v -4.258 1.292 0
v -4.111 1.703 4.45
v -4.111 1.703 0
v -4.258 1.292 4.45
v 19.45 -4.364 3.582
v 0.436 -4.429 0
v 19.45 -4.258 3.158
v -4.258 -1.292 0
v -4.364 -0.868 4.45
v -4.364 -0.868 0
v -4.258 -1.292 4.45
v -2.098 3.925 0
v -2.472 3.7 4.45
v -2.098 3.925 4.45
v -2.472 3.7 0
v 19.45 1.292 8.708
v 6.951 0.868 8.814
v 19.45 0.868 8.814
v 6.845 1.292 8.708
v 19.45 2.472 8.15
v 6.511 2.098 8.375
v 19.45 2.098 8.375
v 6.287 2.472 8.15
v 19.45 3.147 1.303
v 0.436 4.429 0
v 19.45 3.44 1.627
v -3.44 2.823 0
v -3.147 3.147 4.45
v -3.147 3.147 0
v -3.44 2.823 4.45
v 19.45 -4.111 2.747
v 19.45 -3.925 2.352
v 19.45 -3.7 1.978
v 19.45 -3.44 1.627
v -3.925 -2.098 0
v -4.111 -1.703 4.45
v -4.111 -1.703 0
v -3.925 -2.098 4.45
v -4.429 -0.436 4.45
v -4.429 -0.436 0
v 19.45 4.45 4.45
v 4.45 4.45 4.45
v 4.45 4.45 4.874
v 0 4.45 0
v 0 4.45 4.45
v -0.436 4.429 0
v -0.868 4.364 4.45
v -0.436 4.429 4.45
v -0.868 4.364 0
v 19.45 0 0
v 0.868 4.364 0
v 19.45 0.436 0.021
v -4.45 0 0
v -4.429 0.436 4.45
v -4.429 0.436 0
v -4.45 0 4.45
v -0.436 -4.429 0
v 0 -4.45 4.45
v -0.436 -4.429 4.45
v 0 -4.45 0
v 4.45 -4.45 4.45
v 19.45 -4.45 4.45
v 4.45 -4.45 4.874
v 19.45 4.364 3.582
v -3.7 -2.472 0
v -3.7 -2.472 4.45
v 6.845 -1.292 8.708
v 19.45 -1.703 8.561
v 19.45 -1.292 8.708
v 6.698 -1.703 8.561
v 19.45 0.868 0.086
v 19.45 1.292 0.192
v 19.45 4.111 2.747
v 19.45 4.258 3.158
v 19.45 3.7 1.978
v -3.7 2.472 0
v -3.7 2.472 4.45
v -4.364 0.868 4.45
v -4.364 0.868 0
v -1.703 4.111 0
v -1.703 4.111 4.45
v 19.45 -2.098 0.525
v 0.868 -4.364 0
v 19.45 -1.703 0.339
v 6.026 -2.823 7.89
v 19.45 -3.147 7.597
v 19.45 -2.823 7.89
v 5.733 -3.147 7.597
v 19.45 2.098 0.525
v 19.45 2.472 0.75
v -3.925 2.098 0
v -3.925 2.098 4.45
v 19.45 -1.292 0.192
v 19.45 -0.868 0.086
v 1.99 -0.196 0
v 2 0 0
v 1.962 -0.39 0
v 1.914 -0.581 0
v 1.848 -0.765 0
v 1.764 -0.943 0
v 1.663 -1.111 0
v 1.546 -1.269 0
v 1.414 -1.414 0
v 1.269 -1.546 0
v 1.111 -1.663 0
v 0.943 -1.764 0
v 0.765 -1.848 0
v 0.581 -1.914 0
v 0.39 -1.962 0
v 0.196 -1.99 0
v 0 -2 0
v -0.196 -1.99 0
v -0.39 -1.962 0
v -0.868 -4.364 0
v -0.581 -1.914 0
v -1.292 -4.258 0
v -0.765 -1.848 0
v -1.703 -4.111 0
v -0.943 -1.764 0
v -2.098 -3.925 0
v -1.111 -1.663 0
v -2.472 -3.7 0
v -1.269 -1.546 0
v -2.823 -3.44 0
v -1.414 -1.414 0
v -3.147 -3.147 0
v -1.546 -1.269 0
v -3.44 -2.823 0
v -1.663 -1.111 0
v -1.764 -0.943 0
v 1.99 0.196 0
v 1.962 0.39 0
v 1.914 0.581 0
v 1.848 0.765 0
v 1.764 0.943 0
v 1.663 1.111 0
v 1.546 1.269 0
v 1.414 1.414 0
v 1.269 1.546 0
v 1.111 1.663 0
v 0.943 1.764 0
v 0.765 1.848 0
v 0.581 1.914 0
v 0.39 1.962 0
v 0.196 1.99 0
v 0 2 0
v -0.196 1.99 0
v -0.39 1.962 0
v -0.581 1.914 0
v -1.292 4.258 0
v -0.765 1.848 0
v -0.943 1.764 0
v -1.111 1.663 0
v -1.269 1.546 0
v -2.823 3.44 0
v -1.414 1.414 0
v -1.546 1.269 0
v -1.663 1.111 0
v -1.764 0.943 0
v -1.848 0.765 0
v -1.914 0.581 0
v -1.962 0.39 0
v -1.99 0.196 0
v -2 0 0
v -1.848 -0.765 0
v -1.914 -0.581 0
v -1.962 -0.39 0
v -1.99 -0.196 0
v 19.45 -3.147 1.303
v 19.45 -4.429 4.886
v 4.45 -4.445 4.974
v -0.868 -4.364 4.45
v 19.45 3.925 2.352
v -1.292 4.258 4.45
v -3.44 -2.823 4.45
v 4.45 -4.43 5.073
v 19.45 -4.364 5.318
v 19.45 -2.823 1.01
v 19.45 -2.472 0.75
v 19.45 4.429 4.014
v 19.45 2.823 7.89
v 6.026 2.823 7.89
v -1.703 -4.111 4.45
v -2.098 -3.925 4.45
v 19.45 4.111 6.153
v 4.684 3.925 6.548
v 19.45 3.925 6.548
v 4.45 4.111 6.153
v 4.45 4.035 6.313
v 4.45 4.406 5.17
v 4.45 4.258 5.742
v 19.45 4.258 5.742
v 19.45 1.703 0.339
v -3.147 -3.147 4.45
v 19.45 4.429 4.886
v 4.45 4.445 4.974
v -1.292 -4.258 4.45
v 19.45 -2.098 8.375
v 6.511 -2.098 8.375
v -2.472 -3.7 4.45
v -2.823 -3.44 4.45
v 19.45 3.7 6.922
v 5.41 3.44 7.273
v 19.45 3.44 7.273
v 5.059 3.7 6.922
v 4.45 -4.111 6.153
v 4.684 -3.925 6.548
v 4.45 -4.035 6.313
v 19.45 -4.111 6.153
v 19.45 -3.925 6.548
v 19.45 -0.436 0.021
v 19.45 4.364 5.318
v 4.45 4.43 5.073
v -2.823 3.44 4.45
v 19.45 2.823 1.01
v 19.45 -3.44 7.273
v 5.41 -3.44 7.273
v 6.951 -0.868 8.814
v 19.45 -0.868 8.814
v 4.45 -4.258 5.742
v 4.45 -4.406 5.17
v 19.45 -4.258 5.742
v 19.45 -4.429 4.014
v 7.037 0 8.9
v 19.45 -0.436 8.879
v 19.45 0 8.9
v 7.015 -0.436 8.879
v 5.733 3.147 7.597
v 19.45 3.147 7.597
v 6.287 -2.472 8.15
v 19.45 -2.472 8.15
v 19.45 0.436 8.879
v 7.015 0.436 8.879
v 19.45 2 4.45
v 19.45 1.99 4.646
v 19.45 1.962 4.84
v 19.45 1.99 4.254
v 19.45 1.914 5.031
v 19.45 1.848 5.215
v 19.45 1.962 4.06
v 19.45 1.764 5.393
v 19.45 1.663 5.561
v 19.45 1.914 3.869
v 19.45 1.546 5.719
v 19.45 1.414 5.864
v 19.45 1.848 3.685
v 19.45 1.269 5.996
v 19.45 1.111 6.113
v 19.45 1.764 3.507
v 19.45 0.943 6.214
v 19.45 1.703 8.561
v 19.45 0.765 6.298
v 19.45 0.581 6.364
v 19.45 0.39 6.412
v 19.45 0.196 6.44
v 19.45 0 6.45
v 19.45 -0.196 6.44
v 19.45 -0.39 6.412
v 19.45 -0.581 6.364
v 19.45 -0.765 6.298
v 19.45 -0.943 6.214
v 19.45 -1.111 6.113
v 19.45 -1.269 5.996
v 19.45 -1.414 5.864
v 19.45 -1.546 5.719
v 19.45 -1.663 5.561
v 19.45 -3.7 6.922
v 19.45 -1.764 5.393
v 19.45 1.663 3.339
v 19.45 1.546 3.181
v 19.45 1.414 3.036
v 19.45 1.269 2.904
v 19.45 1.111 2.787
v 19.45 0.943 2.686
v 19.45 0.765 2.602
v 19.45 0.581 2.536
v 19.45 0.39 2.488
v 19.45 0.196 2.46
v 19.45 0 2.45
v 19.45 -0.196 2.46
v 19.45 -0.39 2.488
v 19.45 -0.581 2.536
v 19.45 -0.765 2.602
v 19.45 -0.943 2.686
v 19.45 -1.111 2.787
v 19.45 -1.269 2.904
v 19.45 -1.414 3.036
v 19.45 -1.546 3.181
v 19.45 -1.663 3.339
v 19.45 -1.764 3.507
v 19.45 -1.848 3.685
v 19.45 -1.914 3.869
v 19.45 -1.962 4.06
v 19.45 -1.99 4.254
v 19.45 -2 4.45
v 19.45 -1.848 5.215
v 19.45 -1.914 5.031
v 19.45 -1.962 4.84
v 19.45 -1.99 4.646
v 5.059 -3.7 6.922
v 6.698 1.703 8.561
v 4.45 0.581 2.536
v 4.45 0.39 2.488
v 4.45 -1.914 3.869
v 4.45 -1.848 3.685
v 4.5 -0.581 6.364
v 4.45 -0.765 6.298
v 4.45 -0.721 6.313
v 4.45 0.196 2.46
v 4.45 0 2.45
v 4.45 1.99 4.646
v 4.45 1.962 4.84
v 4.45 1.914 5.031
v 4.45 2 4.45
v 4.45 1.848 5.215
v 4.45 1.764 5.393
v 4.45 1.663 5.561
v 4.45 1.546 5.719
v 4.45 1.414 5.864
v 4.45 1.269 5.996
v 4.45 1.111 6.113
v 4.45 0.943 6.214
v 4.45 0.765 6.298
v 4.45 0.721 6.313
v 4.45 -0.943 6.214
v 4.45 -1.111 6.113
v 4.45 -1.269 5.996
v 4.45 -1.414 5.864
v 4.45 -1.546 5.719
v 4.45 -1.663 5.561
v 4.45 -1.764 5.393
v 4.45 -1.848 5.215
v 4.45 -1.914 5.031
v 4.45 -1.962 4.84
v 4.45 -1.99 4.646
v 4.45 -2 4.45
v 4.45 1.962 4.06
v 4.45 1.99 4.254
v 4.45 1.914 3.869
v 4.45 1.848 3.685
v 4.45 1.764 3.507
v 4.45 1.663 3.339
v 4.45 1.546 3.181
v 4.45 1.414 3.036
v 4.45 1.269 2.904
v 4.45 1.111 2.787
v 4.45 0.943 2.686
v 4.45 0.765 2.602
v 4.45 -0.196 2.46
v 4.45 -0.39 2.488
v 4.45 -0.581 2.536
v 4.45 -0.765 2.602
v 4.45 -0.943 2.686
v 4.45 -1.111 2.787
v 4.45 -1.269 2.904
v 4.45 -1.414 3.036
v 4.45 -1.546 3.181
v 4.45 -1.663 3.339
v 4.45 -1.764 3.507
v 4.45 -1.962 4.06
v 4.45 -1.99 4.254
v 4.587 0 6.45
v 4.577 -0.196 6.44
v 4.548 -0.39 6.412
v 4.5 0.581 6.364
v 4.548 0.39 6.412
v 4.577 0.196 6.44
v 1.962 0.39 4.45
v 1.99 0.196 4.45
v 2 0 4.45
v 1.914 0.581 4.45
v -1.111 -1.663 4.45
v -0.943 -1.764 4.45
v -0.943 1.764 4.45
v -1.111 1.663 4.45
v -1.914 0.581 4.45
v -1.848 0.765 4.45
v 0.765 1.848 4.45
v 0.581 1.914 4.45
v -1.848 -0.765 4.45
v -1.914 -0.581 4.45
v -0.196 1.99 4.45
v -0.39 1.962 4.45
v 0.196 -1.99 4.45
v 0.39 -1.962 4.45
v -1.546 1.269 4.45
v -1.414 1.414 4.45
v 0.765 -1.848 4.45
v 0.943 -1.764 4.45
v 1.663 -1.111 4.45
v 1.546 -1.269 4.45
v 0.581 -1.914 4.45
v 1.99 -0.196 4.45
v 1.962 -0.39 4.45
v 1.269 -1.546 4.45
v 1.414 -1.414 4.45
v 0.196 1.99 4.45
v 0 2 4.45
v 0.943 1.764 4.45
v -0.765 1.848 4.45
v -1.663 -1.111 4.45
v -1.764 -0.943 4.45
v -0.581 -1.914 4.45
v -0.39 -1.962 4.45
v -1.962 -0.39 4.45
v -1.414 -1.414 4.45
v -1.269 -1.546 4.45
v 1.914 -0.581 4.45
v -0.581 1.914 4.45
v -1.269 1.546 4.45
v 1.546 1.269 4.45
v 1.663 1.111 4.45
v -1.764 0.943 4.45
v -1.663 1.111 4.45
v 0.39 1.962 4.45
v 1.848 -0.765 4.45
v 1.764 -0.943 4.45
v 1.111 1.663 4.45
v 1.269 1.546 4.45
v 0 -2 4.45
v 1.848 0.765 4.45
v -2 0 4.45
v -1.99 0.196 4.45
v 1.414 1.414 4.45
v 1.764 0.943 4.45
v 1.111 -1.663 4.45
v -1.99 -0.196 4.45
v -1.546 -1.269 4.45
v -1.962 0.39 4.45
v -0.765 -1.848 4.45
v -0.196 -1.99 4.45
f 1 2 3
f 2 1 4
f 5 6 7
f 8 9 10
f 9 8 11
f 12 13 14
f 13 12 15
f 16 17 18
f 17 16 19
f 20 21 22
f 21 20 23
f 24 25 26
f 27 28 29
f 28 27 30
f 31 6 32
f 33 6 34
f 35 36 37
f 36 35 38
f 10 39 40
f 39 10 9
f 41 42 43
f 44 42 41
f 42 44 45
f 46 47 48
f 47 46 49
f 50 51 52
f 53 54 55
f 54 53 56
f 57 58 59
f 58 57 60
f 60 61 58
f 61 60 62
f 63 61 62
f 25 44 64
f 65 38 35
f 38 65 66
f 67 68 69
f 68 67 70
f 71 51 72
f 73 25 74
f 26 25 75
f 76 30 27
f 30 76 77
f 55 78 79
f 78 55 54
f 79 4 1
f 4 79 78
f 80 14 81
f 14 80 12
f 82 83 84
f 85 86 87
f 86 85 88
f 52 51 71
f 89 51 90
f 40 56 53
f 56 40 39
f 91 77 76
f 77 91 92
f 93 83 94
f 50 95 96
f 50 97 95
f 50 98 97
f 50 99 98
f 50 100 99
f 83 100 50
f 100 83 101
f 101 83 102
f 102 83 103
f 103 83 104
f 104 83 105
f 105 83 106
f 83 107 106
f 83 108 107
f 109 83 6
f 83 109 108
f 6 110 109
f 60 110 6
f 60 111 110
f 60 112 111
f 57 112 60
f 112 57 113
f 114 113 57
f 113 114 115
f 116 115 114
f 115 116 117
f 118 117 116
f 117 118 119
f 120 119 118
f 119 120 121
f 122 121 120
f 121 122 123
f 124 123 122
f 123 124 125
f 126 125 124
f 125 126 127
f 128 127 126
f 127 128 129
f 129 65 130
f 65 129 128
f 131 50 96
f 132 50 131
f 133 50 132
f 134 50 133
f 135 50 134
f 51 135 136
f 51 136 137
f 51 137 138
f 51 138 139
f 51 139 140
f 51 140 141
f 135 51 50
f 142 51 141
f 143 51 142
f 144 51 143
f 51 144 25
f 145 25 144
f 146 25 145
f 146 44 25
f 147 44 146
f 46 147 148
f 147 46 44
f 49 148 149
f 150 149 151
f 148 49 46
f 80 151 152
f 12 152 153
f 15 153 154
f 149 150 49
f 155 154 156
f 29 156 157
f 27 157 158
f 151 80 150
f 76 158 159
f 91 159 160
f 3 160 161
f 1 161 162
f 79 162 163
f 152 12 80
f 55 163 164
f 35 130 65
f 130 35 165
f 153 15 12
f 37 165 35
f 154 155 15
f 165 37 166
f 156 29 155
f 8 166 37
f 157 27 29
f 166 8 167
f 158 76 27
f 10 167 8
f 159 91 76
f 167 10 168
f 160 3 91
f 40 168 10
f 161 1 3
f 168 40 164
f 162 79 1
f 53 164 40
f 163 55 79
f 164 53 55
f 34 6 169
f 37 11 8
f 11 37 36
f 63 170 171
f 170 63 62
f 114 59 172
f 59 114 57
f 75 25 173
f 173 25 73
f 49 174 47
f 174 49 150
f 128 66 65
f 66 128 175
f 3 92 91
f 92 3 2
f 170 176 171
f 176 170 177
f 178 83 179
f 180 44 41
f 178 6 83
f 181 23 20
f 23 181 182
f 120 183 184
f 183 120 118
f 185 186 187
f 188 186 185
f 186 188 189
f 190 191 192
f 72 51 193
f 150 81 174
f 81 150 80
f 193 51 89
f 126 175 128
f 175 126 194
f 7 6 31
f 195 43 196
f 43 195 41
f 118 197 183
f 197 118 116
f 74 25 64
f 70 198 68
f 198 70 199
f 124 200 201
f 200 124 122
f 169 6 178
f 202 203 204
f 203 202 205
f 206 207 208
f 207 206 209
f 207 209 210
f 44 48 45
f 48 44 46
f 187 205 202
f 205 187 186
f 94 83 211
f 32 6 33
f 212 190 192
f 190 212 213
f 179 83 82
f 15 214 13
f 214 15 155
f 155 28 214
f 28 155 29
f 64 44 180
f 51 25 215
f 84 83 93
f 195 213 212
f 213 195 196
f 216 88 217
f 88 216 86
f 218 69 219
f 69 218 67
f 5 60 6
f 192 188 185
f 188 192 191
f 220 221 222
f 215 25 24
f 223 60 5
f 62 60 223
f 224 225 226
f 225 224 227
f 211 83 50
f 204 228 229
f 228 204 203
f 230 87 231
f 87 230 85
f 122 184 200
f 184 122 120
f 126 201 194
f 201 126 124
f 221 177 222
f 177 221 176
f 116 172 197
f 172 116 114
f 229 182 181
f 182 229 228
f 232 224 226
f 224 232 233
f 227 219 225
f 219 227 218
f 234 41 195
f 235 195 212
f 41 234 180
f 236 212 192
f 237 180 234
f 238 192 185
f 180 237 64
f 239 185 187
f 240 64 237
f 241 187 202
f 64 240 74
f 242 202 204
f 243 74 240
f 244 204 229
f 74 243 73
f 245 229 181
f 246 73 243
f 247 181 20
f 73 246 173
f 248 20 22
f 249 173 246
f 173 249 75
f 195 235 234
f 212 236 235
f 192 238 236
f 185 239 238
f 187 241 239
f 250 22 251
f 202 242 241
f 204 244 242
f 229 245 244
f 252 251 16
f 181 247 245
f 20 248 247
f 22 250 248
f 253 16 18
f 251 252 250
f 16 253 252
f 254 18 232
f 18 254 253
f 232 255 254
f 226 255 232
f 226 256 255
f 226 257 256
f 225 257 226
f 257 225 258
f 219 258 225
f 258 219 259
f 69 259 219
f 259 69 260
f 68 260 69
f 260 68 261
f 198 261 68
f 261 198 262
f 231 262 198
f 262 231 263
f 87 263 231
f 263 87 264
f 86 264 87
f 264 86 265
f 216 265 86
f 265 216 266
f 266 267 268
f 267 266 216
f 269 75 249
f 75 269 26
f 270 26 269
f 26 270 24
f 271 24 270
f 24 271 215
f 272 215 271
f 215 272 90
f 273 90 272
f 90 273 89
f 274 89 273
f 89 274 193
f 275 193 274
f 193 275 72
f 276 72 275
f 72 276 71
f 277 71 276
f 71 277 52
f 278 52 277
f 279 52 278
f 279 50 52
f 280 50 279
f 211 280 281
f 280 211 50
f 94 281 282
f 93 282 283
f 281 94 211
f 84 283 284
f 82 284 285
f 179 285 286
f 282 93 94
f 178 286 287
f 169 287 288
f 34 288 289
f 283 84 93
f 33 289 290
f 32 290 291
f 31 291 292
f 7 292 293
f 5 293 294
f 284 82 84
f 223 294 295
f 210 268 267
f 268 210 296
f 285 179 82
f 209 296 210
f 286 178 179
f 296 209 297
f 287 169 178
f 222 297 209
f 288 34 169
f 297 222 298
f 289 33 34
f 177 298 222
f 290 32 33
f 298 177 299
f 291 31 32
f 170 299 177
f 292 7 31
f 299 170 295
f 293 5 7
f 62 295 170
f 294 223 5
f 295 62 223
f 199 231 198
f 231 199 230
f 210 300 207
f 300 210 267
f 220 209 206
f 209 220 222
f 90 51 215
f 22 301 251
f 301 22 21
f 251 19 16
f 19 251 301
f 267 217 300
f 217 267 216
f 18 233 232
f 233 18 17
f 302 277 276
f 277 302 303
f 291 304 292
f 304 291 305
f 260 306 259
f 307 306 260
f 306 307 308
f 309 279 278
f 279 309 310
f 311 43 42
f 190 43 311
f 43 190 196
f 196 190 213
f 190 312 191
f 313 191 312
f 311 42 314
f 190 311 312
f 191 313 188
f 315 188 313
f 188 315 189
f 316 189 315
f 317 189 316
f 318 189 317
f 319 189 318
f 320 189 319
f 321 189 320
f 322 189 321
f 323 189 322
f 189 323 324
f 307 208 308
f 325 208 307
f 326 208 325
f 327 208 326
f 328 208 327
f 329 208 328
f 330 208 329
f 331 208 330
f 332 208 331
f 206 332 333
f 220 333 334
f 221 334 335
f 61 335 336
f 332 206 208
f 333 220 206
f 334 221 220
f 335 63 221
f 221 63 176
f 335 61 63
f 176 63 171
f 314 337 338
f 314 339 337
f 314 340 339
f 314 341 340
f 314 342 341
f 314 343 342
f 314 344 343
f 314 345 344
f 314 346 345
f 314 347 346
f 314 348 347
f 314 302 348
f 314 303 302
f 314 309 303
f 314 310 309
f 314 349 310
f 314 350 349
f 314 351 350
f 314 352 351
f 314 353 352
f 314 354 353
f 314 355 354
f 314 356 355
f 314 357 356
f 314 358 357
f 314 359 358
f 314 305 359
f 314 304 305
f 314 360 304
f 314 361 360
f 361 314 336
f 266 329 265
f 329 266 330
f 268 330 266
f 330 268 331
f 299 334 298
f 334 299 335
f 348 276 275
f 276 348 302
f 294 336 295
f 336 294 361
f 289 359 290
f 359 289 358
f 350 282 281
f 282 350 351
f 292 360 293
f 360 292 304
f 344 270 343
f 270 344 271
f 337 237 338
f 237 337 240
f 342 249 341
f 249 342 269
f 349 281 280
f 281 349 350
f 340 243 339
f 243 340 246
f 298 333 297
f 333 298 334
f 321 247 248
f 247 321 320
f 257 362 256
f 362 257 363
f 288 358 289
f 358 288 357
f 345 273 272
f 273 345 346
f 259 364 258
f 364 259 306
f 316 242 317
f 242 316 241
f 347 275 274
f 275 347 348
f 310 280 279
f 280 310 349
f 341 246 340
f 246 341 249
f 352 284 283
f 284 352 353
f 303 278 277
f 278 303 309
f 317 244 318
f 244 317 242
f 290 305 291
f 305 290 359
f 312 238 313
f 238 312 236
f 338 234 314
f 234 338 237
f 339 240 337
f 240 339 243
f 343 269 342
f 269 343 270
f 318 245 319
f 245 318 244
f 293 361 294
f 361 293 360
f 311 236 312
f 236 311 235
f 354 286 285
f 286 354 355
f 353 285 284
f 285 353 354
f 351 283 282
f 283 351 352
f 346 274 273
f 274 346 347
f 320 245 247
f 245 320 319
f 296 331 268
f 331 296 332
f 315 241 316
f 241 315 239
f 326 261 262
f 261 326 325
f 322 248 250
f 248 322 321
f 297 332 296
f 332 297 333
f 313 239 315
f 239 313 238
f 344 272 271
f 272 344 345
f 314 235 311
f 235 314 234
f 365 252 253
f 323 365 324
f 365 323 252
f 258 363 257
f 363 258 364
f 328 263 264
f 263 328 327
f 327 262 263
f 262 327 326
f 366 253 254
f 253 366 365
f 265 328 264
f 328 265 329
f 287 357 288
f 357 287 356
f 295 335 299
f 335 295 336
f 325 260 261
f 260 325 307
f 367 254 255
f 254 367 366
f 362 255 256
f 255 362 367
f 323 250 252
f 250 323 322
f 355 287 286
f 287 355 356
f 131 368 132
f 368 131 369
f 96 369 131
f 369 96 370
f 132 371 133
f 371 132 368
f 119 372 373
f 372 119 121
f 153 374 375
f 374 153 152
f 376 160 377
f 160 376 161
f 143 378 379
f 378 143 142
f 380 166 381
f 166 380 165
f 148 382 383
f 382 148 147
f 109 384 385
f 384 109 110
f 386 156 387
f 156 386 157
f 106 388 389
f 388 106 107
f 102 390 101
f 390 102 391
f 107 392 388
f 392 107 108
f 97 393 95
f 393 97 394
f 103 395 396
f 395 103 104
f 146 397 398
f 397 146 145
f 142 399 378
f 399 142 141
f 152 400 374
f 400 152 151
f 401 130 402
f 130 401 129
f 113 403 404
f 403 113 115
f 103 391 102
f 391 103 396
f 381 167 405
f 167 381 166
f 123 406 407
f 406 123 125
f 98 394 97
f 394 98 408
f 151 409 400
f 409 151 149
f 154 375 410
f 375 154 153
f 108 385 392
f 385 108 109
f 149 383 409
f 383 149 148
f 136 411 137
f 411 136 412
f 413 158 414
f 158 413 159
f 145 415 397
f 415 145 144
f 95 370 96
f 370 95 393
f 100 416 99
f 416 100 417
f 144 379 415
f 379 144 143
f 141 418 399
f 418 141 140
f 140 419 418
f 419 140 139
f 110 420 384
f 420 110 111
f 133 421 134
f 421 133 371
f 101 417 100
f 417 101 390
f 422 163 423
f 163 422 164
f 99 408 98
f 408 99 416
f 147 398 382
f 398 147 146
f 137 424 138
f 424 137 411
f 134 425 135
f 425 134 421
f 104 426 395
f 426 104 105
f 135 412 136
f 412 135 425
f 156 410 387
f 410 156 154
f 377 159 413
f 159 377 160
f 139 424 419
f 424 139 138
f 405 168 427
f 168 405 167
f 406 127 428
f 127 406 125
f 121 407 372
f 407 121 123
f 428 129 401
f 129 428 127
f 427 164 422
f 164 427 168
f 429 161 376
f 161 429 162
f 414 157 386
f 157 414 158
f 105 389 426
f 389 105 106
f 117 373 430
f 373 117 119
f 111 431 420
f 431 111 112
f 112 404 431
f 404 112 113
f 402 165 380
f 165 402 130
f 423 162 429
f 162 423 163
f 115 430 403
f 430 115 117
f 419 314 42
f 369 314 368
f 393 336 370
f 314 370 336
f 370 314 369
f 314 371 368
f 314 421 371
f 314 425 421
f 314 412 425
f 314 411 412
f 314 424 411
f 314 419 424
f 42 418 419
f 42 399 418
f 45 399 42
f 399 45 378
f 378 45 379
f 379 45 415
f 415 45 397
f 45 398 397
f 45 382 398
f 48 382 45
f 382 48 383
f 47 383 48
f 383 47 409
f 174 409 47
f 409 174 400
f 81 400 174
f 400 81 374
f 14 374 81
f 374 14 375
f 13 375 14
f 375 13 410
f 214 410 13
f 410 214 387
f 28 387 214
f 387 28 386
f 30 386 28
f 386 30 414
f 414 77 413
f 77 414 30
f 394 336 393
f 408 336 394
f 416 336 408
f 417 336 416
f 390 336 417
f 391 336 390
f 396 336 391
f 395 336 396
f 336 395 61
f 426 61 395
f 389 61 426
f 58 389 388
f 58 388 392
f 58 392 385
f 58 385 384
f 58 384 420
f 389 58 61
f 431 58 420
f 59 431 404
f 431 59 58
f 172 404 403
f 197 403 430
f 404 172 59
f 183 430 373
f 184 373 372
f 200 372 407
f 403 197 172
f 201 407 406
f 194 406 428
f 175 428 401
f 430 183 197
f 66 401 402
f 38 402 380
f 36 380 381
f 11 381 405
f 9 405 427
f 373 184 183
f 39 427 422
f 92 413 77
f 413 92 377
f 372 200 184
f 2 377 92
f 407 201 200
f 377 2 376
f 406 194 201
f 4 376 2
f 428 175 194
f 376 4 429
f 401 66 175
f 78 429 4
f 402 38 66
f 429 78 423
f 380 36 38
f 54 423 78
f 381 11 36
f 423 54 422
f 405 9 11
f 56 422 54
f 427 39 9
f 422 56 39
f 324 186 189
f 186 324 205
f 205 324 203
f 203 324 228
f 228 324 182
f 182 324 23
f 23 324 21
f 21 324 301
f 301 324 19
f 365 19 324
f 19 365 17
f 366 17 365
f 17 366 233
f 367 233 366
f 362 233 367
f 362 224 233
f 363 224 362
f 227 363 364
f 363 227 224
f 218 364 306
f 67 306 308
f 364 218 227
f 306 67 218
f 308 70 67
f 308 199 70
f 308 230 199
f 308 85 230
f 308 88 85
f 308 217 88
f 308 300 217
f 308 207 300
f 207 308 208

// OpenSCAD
s_d = 4; // stångens diameter
f_d = 4;
tjock = 8.9;
$fn=64;

difference() {
    union(){
        hull() {
            cylinder(d=tjock, h=5);
            translate([tjock/2,0,tjock/2]) rotate([0,90,0]) cylinder(d=tjock, h=15);
        }
    }
    translate([tjock/2,0,tjock/2]) rotate([0,90,0]) cylinder(d=s_d, h=15);
    cylinder(d=f_d, h=15);
    translate([-tjock/2,-tjock/2,tjock/2]) cube(tjock);
    translate([-tjock/2+1,-tjock/2,11]) rotate([0,45,0])  cube(tjock);
    
}
